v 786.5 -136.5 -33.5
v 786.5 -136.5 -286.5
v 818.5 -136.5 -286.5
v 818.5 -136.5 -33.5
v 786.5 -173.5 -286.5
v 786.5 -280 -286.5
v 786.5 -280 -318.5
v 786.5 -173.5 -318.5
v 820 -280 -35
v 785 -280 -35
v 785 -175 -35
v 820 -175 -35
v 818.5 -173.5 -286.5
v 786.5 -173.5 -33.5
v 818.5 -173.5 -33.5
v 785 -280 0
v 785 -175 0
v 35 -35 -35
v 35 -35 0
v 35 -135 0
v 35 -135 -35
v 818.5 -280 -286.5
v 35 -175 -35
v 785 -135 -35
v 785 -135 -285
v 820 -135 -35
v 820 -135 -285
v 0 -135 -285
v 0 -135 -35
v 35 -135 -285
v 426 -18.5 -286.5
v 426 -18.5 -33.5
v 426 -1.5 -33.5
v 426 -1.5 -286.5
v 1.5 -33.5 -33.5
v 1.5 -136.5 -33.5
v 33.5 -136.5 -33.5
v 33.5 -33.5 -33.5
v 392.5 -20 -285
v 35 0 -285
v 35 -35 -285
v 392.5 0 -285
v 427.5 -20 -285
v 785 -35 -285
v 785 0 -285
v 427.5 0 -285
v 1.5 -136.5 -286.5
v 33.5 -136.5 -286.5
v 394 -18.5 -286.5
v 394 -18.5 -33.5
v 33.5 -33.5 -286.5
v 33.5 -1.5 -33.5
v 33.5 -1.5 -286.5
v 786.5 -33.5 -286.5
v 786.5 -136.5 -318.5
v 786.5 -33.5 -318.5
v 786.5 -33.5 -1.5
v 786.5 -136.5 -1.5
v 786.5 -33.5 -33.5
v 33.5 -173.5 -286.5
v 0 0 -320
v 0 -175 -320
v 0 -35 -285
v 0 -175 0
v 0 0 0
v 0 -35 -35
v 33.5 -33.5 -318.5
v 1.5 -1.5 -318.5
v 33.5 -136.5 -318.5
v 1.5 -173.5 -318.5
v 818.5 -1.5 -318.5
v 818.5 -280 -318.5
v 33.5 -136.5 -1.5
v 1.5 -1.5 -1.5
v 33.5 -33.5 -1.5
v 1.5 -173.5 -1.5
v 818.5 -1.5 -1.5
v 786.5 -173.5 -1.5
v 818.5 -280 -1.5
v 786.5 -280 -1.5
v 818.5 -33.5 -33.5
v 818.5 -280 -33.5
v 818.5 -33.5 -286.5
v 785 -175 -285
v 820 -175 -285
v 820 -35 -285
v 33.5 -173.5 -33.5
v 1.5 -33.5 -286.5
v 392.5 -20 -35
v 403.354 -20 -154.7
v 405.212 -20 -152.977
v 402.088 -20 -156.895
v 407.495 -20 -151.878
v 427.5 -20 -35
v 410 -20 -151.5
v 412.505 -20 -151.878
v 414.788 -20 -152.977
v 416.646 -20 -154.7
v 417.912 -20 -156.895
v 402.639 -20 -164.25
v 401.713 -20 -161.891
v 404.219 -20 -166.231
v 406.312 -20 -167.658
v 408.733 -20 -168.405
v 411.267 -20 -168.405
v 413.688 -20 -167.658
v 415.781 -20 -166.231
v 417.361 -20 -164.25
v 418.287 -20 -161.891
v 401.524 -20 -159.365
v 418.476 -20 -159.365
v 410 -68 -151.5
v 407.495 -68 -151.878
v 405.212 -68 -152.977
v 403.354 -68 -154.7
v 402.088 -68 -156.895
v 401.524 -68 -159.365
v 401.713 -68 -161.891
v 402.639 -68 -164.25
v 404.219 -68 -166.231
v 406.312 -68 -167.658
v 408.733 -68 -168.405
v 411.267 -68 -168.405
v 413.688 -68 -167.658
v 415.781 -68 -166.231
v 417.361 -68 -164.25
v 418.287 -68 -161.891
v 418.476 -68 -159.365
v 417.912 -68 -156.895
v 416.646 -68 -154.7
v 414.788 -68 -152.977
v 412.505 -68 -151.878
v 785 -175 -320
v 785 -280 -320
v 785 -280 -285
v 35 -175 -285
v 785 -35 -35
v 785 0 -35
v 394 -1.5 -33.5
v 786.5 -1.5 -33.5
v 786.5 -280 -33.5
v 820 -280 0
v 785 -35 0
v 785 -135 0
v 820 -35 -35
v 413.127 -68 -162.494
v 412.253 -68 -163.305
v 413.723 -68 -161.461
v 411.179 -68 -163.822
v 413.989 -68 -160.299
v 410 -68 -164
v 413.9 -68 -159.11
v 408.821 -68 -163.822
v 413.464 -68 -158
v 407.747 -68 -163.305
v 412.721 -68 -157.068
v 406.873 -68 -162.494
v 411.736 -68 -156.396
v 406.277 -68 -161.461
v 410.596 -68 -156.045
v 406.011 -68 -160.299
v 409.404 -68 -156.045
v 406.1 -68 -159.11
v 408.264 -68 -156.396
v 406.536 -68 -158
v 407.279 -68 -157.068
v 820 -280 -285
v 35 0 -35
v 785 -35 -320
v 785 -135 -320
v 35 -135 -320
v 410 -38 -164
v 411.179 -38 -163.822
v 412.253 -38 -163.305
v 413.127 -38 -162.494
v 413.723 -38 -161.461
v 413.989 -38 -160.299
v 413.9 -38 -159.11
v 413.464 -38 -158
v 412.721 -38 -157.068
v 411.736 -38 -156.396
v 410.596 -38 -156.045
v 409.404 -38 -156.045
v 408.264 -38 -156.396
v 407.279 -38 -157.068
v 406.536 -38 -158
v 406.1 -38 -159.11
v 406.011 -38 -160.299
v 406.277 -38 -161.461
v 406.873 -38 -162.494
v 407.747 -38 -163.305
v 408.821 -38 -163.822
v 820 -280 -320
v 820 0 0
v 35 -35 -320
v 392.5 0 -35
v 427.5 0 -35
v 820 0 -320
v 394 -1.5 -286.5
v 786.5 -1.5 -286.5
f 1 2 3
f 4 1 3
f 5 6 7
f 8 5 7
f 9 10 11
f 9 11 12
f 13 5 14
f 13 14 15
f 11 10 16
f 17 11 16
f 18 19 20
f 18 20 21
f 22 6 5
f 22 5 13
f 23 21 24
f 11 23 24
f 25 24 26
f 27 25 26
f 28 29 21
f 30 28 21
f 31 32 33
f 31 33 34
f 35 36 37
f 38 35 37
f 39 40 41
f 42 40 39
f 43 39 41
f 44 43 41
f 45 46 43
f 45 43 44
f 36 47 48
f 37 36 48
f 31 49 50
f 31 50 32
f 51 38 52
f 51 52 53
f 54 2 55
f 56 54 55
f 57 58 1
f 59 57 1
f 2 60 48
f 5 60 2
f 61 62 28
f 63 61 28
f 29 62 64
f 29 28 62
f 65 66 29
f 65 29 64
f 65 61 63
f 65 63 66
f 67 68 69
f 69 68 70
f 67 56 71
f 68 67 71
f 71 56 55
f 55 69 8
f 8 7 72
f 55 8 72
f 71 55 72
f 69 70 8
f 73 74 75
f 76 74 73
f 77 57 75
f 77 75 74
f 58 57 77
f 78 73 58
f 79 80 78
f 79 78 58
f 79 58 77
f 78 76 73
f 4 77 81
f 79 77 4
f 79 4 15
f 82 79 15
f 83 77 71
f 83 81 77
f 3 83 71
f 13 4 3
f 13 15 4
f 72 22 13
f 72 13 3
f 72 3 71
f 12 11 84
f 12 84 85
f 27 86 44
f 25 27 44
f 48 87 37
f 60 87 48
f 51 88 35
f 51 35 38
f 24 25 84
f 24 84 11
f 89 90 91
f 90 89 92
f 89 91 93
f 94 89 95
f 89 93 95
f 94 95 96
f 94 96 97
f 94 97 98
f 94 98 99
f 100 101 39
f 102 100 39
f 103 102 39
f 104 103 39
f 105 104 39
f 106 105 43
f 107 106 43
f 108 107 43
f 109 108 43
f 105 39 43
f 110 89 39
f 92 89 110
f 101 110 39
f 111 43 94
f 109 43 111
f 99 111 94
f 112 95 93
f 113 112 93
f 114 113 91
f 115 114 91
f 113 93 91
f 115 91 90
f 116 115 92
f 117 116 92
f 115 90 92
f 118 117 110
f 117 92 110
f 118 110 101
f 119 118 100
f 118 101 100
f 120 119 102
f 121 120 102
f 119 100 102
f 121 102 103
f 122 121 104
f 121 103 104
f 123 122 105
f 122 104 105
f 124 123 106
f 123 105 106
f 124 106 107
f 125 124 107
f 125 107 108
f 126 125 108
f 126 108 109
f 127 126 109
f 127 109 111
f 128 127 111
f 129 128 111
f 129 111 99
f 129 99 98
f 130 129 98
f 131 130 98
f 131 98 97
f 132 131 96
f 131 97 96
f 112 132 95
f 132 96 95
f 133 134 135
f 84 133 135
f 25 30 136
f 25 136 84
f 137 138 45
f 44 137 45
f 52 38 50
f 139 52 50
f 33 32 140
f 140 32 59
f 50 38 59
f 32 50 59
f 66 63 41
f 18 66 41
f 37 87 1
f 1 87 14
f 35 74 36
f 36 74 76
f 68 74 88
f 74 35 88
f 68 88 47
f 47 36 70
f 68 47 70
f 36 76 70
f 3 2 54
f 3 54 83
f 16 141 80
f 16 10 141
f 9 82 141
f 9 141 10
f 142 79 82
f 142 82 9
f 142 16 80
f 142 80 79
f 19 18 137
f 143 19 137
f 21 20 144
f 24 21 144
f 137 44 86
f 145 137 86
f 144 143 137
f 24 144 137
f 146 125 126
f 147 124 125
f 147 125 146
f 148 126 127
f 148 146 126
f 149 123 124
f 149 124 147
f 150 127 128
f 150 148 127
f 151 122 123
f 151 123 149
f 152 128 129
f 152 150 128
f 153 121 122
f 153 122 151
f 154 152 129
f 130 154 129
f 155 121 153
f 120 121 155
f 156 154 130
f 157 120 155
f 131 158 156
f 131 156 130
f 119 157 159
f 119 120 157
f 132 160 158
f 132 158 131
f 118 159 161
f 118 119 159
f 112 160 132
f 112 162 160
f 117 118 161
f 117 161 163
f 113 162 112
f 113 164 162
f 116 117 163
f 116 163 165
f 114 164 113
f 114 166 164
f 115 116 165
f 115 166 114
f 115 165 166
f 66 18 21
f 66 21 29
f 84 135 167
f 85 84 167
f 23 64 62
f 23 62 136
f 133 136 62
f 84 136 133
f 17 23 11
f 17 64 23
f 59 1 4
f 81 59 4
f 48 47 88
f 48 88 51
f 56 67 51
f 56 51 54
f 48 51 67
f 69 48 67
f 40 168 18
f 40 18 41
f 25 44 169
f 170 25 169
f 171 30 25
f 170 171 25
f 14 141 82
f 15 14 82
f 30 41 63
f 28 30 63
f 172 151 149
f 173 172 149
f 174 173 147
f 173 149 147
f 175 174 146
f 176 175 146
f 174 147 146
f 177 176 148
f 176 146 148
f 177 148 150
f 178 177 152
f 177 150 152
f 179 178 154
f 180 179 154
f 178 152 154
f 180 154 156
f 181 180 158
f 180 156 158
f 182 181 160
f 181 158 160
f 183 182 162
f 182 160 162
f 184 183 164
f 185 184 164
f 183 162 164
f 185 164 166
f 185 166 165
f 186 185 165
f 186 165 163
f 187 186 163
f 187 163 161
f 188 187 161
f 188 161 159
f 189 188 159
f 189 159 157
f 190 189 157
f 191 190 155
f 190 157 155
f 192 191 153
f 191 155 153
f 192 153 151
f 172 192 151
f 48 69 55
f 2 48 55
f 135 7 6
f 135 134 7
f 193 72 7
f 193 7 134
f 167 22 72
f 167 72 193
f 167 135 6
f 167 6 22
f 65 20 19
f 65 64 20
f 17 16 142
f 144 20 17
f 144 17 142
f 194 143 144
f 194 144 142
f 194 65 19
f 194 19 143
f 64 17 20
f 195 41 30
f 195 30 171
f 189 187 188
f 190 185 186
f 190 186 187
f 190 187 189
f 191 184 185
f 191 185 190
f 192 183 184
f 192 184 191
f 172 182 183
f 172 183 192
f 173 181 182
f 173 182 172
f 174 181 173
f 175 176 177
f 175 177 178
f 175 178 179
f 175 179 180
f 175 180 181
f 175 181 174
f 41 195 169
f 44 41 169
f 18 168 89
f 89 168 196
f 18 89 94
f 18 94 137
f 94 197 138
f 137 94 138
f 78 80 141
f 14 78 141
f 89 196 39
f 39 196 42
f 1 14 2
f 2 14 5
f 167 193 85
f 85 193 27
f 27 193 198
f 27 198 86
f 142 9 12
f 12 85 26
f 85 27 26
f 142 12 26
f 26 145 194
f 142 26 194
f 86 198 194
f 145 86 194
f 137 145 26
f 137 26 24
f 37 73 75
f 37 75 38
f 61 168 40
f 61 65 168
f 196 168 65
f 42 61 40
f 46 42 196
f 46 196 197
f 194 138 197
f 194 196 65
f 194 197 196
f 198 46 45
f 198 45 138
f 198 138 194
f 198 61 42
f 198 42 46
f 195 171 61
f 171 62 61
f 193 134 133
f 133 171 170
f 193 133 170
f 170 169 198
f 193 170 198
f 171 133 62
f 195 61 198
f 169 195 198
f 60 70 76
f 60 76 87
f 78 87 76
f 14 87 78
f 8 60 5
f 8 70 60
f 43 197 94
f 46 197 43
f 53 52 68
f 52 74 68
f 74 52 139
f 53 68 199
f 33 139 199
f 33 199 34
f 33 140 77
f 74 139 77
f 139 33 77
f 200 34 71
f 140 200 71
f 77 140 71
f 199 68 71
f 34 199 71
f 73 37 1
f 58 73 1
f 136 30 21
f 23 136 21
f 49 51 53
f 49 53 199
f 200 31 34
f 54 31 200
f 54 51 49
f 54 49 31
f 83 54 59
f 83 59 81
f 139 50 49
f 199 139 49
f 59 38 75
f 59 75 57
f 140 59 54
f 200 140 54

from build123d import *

# Parameters (mm, degrees)
SKETCH2_W            = 820
SKETCH2_H            = 320
SKETCH2_W_2          = 750
SKETCH2_H_2          = 250
BOSS_EXTRUDE1_DEPTH  = 35
SKETCH7_W            = 35
SKETCH7_H            = 250
BOSS_EXTRUDE6_DEPTH  = 20
SKETCH3_W            = 35
SKETCH3_H            = 35
BOSS_EXTRUDE2_DEPTH  = 100
SKETCH4_W            = 820
SKETCH4_H            = 320
SKETCH4_W_2          = 750
SKETCH4_H_2          = 250
BOSS_EXTRUDE3_DEPTH  = 40
SKETCH5_W            = 35
SKETCH5_H            = 35
BOSS_EXTRUDE4_DEPTH  = 105
SHELL1_START         = -173.5
SHELL1_OUTLINE_W     = 817
SHELL1_OUTLINE_H     = 317
SHELL1_OUTLINE_W_2   = 753
SHELL1_OUTLINE_H_2   = 253
SHELL1_DEPTH         = 37
SHELL1_START_2       = -33.5
SHELL1_2_OUTLINE_W   = 817
SHELL1_2_OUTLINE_H   = 317
SHELL1_2_OUTLINE_W_2 = 753
SHELL1_2_OUTLINE_H_2 = 253
SHELL1_2_DEPTH       = 32
SHELL1_START_3       = -280
SHELL1_3_OUTLINE_W   = 32
SHELL1_3_OUTLINE_H   = 32
SHELL1_3_DEPTH       = 246.5
SHELL1_START_4       = -136.5
SHELL1_4_OUTLINE_W   = 32
SHELL1_4_OUTLINE_H   = 32
SHELL1_4_DEPTH       = 103
SHELL1_START_5       = -18.5
SHELL1_5_OUTLINE_W   = 32
SHELL1_5_OUTLINE_H   = 253
SHELL1_5_DEPTH       = 17
BOSS_EXTRUDE5_START  = 20
SKETCH6_R            = 8.5
BOSS_EXTRUDE5_DEPTH  = 48
SKETCH8_R            = 4
CUT_EXTRUDE1_DEPTH   = 30


# Read off the part's stored shape, not the designer's step: Shell1
with BuildPart() as part:
    # Sketch2 → Boss-Extrude1 (new body)
    with BuildSketch(Plane(origin=(0, 0, 0), x_dir=(1, 0, 0), z_dir=(0, 1, 0))):
        with Locations((410, 160)):
            Rectangle(SKETCH2_W, SKETCH2_H)
        with Locations((410, 160)):
            Rectangle(SKETCH2_W_2, SKETCH2_H_2, mode=Mode.SUBTRACT)
    extrude(amount=-BOSS_EXTRUDE1_DEPTH)

    # Sketch7 → Boss-Extrude6 (add)
    with BuildSketch(Plane(origin=(0, 0, 0), x_dir=(1, 0, 0), z_dir=(0, 1, 0))):
        with Locations((410, 160)):
            Rectangle(SKETCH7_W, SKETCH7_H)
    extrude(amount=-BOSS_EXTRUDE6_DEPTH)

    # Sketch3 → Boss-Extrude2 (add)
    with BuildSketch(Plane(origin=(0, -35, 0), x_dir=(-1, 0, 0), z_dir=(0, -1, 0))):
        with Locations((-17.5, 17.5)):
            Rectangle(SKETCH3_W, SKETCH3_H)
        with Locations((-17.5, 302.5)):
            Rectangle(SKETCH3_W, SKETCH3_H)
        with Locations((-802.5, 302.5)):
            Rectangle(SKETCH3_W, SKETCH3_H)
        with Locations((-802.5, 17.5)):
            Rectangle(SKETCH3_W, SKETCH3_H)
    extrude(amount=BOSS_EXTRUDE2_DEPTH)

    # Sketch4 → Boss-Extrude3 (add)
    with BuildSketch(Plane.XZ.offset(135)):
        with Locations((410, -160)):
            Rectangle(SKETCH4_W, SKETCH4_H)
        with Locations((410, -160)):
            Rectangle(SKETCH4_W_2, SKETCH4_H_2, mode=Mode.SUBTRACT)
    extrude(amount=BOSS_EXTRUDE3_DEPTH)

    # Sketch5 → Boss-Extrude4 (add)
    with BuildSketch(Plane.XZ.offset(175)):
        with Locations((802.5, -17.5)):
            Rectangle(SKETCH5_W, SKETCH5_H)
        with Locations((802.5, -302.5)):
            Rectangle(SKETCH5_W, SKETCH5_H)
    extrude(amount=BOSS_EXTRUDE4_DEPTH)

    # Shell1 outline → Shell1 (cut)
    with BuildSketch(Plane(origin=(0, 0, 0), x_dir=(1, 0, 0), z_dir=(0, 1, 0)).offset(SHELL1_START)):
        with Locations((410, 160)):
            Rectangle(SHELL1_OUTLINE_W, SHELL1_OUTLINE_H)
        with Locations((410, 160)):
            Rectangle(SHELL1_OUTLINE_W_2, SHELL1_OUTLINE_H_2, mode=Mode.SUBTRACT)
    extrude(amount=SHELL1_DEPTH, mode=Mode.SUBTRACT)

    # Shell1 2 outline → Shell1 2 (cut)
    with BuildSketch(Plane(origin=(0, 0, 0), x_dir=(1, 0, 0), z_dir=(0, 1, 0)).offset(SHELL1_START_2)):
        with Locations((410, 160)):
            Rectangle(SHELL1_2_OUTLINE_W, SHELL1_2_OUTLINE_H)
        with Locations((410, 160)):
            Rectangle(SHELL1_2_OUTLINE_W_2, SHELL1_2_OUTLINE_H_2, mode=Mode.SUBTRACT)
    extrude(amount=SHELL1_2_DEPTH, mode=Mode.SUBTRACT)

    # Shell1 3 outline → Shell1 3 (cut)
    with BuildSketch(Plane(origin=(0, 0, 0), x_dir=(1, 0, 0), z_dir=(0, 1, 0)).offset(SHELL1_START_3)):
        with Locations((802.5, 302.5)):
            Rectangle(SHELL1_3_OUTLINE_W, SHELL1_3_OUTLINE_H)
        with Locations((802.5, 17.5)):
            Rectangle(SHELL1_3_OUTLINE_W, SHELL1_3_OUTLINE_H)
    extrude(amount=SHELL1_3_DEPTH, mode=Mode.SUBTRACT)

    # Shell1 4 outline → Shell1 4 (cut)
    with BuildSketch(Plane(origin=(0, 0, 0), x_dir=(1, 0, 0), z_dir=(0, 1, 0)).offset(SHELL1_START_4)):
        with Locations((17.5, 302.5)):
            Rectangle(SHELL1_4_OUTLINE_W, SHELL1_4_OUTLINE_H)
        with Locations((17.5, 17.5)):
            Rectangle(SHELL1_4_OUTLINE_W, SHELL1_4_OUTLINE_H)
    extrude(amount=SHELL1_4_DEPTH, mode=Mode.SUBTRACT)

    # Shell1 5 outline → Shell1 5 (cut)
    with BuildSketch(Plane(origin=(0, 0, 0), x_dir=(1, 0, 0), z_dir=(0, 1, 0)).offset(SHELL1_START_5)):
        with Locations((410, 160)):
            Rectangle(SHELL1_5_OUTLINE_W, SHELL1_5_OUTLINE_H)
    extrude(amount=SHELL1_5_DEPTH, mode=Mode.SUBTRACT)

    # Sketch6 → Boss-Extrude5 (add)
    with BuildSketch(Plane(origin=(0, 0, 0), x_dir=(-1, 0, 0), z_dir=(0, -1, 0)).offset(BOSS_EXTRUDE5_START)):
        with Locations(Location((-410, 160, 0), (0, 0, 270))):
            Circle(SKETCH6_R)
    extrude(amount=BOSS_EXTRUDE5_DEPTH)

    # Sketch8 → Cut-Extrude1 (cut)
    with BuildSketch(Plane.XZ.offset(68)):
        with Locations(Location((410, -160, 0), (0, 0, 270))):
            Circle(SKETCH8_R)
    extrude(amount=-CUT_EXTRUDE1_DEPTH, mode=Mode.SUBTRACT)


solid = part.part
